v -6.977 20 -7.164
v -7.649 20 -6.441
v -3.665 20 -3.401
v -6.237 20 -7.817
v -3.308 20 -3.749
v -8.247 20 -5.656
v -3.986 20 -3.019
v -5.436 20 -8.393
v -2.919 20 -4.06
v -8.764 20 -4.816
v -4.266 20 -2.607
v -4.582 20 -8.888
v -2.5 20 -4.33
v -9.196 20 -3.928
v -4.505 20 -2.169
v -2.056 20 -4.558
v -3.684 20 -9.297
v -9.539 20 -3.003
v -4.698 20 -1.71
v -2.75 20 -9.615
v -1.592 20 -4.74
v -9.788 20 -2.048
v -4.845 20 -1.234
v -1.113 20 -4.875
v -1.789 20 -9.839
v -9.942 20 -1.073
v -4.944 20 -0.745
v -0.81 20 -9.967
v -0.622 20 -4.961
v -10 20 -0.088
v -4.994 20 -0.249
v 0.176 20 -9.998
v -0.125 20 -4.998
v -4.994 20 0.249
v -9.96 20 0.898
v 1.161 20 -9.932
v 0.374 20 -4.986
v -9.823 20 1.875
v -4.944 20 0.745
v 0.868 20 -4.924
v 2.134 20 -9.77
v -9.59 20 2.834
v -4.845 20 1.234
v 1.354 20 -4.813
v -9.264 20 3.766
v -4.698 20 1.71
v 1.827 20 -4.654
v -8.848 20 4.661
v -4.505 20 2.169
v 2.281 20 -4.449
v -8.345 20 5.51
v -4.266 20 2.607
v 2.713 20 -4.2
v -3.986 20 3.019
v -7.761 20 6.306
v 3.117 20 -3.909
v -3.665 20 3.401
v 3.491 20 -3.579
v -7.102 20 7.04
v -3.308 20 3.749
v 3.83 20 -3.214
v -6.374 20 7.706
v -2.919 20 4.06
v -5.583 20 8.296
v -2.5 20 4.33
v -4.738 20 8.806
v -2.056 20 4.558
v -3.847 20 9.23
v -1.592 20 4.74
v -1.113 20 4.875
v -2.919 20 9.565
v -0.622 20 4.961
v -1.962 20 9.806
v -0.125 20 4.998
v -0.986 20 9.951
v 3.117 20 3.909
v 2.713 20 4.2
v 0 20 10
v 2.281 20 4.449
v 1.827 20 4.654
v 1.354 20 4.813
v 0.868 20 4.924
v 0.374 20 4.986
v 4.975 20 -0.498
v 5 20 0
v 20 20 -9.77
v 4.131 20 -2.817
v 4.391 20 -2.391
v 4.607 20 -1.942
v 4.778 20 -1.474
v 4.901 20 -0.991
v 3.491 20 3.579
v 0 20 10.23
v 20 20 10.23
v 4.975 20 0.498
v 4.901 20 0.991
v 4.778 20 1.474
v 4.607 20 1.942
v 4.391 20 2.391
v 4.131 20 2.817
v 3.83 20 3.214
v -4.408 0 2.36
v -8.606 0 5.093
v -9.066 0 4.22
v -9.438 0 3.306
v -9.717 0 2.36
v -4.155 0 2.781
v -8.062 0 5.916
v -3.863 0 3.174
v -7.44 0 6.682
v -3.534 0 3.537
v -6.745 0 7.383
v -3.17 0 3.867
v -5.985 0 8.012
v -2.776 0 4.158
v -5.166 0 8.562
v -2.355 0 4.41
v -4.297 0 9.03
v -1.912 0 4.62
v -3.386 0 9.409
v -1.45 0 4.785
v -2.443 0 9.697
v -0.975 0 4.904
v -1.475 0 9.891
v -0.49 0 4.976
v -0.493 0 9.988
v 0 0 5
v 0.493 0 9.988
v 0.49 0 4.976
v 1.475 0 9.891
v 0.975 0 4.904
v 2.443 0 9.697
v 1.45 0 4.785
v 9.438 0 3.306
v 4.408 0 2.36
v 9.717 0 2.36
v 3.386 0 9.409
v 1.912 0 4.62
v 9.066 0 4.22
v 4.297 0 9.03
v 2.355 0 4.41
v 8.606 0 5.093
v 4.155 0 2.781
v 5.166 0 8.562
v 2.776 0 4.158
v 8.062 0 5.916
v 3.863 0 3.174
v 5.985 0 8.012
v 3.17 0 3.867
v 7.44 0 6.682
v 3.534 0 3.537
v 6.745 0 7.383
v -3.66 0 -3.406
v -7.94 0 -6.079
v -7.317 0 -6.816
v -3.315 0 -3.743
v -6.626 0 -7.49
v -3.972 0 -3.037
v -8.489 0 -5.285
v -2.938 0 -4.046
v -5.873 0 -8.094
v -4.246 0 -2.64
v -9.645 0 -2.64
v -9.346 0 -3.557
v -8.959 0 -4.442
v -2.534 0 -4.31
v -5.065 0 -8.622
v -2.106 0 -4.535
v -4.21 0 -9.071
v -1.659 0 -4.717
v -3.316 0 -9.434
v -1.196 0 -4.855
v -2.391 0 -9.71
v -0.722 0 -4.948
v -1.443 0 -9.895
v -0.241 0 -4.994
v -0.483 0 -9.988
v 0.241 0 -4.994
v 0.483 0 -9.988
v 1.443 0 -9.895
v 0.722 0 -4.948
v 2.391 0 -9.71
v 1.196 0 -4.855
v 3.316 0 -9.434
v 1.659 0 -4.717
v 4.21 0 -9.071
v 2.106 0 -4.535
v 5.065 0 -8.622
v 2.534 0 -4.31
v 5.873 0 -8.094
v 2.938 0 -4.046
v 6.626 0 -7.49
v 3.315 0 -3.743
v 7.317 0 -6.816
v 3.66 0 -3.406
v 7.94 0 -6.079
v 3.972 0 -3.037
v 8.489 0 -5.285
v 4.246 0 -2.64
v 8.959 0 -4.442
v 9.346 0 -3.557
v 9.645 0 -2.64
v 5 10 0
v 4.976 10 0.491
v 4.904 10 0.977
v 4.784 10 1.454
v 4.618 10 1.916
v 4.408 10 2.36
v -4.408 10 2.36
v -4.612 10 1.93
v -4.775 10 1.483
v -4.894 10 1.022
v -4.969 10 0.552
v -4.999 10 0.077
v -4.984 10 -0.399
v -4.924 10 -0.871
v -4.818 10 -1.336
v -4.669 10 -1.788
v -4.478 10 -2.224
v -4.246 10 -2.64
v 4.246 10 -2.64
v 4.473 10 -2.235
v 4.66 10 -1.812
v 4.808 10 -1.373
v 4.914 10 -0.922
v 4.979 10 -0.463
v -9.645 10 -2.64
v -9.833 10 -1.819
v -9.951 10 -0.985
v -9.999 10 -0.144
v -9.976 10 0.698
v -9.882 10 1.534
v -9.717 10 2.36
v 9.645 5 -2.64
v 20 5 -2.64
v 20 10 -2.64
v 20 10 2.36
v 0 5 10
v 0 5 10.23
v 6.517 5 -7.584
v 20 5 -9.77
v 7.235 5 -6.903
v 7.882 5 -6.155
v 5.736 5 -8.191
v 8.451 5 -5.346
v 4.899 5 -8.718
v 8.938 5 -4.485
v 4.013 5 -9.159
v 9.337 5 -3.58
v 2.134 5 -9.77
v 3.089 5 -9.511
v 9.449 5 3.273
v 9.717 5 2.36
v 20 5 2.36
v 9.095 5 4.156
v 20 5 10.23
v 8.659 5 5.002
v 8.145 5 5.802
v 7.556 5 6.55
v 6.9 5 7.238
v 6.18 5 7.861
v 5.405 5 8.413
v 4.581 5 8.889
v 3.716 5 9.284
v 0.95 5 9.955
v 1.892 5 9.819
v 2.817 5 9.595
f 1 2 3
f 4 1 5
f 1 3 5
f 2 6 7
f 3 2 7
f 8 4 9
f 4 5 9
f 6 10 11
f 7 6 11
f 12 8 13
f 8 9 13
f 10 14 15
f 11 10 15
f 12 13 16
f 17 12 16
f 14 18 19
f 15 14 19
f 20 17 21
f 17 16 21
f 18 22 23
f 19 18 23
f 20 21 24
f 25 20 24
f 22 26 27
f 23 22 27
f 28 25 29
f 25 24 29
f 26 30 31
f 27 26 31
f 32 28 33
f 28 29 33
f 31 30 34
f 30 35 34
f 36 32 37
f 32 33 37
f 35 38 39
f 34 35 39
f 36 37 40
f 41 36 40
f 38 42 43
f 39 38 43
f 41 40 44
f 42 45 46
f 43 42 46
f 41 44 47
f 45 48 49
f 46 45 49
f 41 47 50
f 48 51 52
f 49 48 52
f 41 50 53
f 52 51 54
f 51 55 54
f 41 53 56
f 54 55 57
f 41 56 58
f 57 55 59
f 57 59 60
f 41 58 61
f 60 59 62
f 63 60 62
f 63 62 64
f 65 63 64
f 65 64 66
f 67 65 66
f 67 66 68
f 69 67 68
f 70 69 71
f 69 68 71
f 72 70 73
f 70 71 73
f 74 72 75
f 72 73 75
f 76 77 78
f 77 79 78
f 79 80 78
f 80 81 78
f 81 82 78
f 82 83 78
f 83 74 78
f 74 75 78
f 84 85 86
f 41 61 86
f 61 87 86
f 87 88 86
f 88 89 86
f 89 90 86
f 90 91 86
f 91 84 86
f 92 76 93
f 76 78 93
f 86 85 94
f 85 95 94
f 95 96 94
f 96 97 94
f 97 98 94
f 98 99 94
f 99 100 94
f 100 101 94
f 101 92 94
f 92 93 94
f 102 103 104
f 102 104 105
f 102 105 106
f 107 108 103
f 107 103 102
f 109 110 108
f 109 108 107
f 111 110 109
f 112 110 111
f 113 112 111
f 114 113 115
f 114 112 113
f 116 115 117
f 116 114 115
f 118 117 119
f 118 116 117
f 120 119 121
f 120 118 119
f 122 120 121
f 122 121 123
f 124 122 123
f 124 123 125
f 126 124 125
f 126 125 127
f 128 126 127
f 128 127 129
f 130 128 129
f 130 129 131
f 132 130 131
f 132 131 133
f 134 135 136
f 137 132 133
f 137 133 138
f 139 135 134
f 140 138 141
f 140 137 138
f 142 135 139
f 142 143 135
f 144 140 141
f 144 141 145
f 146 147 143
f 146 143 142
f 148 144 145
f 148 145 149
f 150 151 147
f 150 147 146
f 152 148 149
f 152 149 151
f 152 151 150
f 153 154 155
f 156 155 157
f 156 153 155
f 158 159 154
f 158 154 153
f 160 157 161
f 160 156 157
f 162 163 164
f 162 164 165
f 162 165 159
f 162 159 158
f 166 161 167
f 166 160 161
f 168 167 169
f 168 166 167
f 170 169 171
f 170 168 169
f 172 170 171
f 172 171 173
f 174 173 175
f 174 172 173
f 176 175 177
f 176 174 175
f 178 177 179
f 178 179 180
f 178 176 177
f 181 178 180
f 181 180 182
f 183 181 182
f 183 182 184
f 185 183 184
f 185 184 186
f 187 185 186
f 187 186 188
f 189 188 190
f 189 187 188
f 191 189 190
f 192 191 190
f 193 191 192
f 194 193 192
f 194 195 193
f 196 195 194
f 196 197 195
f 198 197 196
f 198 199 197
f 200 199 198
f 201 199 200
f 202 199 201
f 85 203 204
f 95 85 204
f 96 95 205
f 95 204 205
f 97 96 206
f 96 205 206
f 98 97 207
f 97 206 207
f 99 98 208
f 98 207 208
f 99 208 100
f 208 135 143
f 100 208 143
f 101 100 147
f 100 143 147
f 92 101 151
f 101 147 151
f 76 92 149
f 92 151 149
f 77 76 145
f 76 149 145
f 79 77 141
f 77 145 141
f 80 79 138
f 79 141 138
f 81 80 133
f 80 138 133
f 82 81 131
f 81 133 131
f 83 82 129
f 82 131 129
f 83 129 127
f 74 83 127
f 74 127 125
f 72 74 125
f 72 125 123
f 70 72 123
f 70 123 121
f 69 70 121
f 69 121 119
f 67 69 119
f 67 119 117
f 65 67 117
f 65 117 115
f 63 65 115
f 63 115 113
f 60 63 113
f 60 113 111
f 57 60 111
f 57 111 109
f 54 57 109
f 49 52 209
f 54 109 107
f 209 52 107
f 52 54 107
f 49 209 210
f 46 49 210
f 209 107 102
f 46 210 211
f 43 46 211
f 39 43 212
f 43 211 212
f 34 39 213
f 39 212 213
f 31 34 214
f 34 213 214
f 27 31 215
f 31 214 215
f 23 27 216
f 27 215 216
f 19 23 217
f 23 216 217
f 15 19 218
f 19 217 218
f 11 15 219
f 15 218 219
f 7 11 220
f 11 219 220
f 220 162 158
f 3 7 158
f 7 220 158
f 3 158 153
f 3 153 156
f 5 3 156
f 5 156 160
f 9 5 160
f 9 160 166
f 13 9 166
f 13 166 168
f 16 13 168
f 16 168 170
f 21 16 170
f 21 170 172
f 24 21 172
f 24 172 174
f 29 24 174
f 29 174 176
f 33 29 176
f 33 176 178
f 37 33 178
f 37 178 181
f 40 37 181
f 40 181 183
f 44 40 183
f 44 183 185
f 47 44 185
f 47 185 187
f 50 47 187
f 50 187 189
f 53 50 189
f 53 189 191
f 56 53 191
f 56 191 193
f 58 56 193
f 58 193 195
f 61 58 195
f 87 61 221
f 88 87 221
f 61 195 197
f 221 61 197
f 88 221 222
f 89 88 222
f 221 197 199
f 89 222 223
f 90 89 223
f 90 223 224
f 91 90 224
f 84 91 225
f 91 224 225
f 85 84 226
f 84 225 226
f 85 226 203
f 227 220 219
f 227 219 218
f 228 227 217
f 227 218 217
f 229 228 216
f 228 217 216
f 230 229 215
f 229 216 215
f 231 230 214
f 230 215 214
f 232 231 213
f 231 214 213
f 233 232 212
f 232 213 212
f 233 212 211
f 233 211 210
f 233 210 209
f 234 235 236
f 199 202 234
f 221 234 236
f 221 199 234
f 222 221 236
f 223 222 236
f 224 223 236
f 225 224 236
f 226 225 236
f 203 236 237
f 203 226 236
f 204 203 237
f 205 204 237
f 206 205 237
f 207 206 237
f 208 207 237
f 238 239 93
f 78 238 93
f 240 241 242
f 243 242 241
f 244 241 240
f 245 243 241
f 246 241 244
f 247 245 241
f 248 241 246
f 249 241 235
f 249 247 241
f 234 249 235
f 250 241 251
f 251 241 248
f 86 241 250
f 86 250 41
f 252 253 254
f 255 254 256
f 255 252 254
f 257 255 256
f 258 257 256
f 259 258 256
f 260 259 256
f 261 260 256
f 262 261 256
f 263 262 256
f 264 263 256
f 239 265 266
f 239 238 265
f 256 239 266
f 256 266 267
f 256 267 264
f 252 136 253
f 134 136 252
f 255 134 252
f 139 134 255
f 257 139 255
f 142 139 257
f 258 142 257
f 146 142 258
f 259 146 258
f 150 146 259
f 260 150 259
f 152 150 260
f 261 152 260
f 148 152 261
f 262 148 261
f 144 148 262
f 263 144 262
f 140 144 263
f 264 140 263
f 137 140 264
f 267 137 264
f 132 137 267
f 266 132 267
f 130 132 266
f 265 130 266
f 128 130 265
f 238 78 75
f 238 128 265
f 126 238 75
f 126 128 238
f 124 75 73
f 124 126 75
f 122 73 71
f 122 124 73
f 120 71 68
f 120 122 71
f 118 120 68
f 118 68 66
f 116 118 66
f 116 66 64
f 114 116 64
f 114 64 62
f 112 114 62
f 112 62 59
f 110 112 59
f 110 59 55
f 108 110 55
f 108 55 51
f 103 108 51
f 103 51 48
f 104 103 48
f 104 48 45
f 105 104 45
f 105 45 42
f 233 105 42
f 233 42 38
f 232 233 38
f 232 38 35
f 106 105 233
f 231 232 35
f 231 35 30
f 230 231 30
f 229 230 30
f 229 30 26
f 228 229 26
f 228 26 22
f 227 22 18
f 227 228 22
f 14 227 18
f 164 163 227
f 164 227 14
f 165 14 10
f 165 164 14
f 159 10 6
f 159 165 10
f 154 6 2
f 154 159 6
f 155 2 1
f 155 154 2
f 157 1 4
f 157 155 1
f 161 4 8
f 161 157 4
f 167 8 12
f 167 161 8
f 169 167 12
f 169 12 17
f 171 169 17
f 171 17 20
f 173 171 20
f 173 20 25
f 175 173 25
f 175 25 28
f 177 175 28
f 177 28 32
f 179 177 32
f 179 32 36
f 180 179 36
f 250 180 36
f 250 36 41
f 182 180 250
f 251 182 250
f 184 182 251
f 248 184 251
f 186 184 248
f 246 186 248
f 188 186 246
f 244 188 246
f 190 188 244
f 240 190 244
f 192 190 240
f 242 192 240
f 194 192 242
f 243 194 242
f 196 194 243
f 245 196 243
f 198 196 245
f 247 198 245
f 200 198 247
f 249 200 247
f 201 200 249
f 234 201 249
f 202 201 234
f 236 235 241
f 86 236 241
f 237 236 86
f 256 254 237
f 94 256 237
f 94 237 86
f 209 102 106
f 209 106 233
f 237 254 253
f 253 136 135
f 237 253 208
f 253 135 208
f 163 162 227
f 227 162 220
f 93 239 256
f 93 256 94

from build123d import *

# Parameters (mm, degrees)
F0_R          = 10
F0_R_2        = 5
F1_DEPTH      = 20
F2_W          = 15
F2_H          = 20
F3_DEPTH      = 20
F4_R          = 5
F5_DEPTH      = 20.001
F6_W          = 10
F6_H          = 5
F7_DEPTH      = 10.001
F7_DEPTH_BACK = 20.001


with BuildPart() as f1:
    # F0 (on Front) → F1 (new body)
    with BuildSketch(Plane.XZ):
        Circle(F0_R)
        Circle(F0_R_2, mode=Mode.SUBTRACT)
    extrude(amount=-F1_DEPTH)

    # F2 (on Right) → F3 (join)
    with BuildSketch(Plane.YZ):
        with Locations((12.5, 0.2303563431)):
            Rectangle(F2_W, F2_H)
    extrude(amount=F3_DEPTH)

    # F4 (on Front) → F5 (cut, through all)
    with BuildSketch(Plane.XZ):
        Circle(F4_R)
    extrude(amount=-F5_DEPTH, mode=Mode.SUBTRACT)

    # F6 (on Right) → F7 (cut, two sides)
    with BuildSketch(Plane.YZ) as f7_sk:
        with Locations((5, -0.1396772545)):
            Rectangle(F6_W, F6_H)
    extrude(amount=-F7_DEPTH, mode=Mode.SUBTRACT)
    extrude(f7_sk.sketch, amount=F7_DEPTH_BACK, mode=Mode.SUBTRACT)


solid = f1.part
